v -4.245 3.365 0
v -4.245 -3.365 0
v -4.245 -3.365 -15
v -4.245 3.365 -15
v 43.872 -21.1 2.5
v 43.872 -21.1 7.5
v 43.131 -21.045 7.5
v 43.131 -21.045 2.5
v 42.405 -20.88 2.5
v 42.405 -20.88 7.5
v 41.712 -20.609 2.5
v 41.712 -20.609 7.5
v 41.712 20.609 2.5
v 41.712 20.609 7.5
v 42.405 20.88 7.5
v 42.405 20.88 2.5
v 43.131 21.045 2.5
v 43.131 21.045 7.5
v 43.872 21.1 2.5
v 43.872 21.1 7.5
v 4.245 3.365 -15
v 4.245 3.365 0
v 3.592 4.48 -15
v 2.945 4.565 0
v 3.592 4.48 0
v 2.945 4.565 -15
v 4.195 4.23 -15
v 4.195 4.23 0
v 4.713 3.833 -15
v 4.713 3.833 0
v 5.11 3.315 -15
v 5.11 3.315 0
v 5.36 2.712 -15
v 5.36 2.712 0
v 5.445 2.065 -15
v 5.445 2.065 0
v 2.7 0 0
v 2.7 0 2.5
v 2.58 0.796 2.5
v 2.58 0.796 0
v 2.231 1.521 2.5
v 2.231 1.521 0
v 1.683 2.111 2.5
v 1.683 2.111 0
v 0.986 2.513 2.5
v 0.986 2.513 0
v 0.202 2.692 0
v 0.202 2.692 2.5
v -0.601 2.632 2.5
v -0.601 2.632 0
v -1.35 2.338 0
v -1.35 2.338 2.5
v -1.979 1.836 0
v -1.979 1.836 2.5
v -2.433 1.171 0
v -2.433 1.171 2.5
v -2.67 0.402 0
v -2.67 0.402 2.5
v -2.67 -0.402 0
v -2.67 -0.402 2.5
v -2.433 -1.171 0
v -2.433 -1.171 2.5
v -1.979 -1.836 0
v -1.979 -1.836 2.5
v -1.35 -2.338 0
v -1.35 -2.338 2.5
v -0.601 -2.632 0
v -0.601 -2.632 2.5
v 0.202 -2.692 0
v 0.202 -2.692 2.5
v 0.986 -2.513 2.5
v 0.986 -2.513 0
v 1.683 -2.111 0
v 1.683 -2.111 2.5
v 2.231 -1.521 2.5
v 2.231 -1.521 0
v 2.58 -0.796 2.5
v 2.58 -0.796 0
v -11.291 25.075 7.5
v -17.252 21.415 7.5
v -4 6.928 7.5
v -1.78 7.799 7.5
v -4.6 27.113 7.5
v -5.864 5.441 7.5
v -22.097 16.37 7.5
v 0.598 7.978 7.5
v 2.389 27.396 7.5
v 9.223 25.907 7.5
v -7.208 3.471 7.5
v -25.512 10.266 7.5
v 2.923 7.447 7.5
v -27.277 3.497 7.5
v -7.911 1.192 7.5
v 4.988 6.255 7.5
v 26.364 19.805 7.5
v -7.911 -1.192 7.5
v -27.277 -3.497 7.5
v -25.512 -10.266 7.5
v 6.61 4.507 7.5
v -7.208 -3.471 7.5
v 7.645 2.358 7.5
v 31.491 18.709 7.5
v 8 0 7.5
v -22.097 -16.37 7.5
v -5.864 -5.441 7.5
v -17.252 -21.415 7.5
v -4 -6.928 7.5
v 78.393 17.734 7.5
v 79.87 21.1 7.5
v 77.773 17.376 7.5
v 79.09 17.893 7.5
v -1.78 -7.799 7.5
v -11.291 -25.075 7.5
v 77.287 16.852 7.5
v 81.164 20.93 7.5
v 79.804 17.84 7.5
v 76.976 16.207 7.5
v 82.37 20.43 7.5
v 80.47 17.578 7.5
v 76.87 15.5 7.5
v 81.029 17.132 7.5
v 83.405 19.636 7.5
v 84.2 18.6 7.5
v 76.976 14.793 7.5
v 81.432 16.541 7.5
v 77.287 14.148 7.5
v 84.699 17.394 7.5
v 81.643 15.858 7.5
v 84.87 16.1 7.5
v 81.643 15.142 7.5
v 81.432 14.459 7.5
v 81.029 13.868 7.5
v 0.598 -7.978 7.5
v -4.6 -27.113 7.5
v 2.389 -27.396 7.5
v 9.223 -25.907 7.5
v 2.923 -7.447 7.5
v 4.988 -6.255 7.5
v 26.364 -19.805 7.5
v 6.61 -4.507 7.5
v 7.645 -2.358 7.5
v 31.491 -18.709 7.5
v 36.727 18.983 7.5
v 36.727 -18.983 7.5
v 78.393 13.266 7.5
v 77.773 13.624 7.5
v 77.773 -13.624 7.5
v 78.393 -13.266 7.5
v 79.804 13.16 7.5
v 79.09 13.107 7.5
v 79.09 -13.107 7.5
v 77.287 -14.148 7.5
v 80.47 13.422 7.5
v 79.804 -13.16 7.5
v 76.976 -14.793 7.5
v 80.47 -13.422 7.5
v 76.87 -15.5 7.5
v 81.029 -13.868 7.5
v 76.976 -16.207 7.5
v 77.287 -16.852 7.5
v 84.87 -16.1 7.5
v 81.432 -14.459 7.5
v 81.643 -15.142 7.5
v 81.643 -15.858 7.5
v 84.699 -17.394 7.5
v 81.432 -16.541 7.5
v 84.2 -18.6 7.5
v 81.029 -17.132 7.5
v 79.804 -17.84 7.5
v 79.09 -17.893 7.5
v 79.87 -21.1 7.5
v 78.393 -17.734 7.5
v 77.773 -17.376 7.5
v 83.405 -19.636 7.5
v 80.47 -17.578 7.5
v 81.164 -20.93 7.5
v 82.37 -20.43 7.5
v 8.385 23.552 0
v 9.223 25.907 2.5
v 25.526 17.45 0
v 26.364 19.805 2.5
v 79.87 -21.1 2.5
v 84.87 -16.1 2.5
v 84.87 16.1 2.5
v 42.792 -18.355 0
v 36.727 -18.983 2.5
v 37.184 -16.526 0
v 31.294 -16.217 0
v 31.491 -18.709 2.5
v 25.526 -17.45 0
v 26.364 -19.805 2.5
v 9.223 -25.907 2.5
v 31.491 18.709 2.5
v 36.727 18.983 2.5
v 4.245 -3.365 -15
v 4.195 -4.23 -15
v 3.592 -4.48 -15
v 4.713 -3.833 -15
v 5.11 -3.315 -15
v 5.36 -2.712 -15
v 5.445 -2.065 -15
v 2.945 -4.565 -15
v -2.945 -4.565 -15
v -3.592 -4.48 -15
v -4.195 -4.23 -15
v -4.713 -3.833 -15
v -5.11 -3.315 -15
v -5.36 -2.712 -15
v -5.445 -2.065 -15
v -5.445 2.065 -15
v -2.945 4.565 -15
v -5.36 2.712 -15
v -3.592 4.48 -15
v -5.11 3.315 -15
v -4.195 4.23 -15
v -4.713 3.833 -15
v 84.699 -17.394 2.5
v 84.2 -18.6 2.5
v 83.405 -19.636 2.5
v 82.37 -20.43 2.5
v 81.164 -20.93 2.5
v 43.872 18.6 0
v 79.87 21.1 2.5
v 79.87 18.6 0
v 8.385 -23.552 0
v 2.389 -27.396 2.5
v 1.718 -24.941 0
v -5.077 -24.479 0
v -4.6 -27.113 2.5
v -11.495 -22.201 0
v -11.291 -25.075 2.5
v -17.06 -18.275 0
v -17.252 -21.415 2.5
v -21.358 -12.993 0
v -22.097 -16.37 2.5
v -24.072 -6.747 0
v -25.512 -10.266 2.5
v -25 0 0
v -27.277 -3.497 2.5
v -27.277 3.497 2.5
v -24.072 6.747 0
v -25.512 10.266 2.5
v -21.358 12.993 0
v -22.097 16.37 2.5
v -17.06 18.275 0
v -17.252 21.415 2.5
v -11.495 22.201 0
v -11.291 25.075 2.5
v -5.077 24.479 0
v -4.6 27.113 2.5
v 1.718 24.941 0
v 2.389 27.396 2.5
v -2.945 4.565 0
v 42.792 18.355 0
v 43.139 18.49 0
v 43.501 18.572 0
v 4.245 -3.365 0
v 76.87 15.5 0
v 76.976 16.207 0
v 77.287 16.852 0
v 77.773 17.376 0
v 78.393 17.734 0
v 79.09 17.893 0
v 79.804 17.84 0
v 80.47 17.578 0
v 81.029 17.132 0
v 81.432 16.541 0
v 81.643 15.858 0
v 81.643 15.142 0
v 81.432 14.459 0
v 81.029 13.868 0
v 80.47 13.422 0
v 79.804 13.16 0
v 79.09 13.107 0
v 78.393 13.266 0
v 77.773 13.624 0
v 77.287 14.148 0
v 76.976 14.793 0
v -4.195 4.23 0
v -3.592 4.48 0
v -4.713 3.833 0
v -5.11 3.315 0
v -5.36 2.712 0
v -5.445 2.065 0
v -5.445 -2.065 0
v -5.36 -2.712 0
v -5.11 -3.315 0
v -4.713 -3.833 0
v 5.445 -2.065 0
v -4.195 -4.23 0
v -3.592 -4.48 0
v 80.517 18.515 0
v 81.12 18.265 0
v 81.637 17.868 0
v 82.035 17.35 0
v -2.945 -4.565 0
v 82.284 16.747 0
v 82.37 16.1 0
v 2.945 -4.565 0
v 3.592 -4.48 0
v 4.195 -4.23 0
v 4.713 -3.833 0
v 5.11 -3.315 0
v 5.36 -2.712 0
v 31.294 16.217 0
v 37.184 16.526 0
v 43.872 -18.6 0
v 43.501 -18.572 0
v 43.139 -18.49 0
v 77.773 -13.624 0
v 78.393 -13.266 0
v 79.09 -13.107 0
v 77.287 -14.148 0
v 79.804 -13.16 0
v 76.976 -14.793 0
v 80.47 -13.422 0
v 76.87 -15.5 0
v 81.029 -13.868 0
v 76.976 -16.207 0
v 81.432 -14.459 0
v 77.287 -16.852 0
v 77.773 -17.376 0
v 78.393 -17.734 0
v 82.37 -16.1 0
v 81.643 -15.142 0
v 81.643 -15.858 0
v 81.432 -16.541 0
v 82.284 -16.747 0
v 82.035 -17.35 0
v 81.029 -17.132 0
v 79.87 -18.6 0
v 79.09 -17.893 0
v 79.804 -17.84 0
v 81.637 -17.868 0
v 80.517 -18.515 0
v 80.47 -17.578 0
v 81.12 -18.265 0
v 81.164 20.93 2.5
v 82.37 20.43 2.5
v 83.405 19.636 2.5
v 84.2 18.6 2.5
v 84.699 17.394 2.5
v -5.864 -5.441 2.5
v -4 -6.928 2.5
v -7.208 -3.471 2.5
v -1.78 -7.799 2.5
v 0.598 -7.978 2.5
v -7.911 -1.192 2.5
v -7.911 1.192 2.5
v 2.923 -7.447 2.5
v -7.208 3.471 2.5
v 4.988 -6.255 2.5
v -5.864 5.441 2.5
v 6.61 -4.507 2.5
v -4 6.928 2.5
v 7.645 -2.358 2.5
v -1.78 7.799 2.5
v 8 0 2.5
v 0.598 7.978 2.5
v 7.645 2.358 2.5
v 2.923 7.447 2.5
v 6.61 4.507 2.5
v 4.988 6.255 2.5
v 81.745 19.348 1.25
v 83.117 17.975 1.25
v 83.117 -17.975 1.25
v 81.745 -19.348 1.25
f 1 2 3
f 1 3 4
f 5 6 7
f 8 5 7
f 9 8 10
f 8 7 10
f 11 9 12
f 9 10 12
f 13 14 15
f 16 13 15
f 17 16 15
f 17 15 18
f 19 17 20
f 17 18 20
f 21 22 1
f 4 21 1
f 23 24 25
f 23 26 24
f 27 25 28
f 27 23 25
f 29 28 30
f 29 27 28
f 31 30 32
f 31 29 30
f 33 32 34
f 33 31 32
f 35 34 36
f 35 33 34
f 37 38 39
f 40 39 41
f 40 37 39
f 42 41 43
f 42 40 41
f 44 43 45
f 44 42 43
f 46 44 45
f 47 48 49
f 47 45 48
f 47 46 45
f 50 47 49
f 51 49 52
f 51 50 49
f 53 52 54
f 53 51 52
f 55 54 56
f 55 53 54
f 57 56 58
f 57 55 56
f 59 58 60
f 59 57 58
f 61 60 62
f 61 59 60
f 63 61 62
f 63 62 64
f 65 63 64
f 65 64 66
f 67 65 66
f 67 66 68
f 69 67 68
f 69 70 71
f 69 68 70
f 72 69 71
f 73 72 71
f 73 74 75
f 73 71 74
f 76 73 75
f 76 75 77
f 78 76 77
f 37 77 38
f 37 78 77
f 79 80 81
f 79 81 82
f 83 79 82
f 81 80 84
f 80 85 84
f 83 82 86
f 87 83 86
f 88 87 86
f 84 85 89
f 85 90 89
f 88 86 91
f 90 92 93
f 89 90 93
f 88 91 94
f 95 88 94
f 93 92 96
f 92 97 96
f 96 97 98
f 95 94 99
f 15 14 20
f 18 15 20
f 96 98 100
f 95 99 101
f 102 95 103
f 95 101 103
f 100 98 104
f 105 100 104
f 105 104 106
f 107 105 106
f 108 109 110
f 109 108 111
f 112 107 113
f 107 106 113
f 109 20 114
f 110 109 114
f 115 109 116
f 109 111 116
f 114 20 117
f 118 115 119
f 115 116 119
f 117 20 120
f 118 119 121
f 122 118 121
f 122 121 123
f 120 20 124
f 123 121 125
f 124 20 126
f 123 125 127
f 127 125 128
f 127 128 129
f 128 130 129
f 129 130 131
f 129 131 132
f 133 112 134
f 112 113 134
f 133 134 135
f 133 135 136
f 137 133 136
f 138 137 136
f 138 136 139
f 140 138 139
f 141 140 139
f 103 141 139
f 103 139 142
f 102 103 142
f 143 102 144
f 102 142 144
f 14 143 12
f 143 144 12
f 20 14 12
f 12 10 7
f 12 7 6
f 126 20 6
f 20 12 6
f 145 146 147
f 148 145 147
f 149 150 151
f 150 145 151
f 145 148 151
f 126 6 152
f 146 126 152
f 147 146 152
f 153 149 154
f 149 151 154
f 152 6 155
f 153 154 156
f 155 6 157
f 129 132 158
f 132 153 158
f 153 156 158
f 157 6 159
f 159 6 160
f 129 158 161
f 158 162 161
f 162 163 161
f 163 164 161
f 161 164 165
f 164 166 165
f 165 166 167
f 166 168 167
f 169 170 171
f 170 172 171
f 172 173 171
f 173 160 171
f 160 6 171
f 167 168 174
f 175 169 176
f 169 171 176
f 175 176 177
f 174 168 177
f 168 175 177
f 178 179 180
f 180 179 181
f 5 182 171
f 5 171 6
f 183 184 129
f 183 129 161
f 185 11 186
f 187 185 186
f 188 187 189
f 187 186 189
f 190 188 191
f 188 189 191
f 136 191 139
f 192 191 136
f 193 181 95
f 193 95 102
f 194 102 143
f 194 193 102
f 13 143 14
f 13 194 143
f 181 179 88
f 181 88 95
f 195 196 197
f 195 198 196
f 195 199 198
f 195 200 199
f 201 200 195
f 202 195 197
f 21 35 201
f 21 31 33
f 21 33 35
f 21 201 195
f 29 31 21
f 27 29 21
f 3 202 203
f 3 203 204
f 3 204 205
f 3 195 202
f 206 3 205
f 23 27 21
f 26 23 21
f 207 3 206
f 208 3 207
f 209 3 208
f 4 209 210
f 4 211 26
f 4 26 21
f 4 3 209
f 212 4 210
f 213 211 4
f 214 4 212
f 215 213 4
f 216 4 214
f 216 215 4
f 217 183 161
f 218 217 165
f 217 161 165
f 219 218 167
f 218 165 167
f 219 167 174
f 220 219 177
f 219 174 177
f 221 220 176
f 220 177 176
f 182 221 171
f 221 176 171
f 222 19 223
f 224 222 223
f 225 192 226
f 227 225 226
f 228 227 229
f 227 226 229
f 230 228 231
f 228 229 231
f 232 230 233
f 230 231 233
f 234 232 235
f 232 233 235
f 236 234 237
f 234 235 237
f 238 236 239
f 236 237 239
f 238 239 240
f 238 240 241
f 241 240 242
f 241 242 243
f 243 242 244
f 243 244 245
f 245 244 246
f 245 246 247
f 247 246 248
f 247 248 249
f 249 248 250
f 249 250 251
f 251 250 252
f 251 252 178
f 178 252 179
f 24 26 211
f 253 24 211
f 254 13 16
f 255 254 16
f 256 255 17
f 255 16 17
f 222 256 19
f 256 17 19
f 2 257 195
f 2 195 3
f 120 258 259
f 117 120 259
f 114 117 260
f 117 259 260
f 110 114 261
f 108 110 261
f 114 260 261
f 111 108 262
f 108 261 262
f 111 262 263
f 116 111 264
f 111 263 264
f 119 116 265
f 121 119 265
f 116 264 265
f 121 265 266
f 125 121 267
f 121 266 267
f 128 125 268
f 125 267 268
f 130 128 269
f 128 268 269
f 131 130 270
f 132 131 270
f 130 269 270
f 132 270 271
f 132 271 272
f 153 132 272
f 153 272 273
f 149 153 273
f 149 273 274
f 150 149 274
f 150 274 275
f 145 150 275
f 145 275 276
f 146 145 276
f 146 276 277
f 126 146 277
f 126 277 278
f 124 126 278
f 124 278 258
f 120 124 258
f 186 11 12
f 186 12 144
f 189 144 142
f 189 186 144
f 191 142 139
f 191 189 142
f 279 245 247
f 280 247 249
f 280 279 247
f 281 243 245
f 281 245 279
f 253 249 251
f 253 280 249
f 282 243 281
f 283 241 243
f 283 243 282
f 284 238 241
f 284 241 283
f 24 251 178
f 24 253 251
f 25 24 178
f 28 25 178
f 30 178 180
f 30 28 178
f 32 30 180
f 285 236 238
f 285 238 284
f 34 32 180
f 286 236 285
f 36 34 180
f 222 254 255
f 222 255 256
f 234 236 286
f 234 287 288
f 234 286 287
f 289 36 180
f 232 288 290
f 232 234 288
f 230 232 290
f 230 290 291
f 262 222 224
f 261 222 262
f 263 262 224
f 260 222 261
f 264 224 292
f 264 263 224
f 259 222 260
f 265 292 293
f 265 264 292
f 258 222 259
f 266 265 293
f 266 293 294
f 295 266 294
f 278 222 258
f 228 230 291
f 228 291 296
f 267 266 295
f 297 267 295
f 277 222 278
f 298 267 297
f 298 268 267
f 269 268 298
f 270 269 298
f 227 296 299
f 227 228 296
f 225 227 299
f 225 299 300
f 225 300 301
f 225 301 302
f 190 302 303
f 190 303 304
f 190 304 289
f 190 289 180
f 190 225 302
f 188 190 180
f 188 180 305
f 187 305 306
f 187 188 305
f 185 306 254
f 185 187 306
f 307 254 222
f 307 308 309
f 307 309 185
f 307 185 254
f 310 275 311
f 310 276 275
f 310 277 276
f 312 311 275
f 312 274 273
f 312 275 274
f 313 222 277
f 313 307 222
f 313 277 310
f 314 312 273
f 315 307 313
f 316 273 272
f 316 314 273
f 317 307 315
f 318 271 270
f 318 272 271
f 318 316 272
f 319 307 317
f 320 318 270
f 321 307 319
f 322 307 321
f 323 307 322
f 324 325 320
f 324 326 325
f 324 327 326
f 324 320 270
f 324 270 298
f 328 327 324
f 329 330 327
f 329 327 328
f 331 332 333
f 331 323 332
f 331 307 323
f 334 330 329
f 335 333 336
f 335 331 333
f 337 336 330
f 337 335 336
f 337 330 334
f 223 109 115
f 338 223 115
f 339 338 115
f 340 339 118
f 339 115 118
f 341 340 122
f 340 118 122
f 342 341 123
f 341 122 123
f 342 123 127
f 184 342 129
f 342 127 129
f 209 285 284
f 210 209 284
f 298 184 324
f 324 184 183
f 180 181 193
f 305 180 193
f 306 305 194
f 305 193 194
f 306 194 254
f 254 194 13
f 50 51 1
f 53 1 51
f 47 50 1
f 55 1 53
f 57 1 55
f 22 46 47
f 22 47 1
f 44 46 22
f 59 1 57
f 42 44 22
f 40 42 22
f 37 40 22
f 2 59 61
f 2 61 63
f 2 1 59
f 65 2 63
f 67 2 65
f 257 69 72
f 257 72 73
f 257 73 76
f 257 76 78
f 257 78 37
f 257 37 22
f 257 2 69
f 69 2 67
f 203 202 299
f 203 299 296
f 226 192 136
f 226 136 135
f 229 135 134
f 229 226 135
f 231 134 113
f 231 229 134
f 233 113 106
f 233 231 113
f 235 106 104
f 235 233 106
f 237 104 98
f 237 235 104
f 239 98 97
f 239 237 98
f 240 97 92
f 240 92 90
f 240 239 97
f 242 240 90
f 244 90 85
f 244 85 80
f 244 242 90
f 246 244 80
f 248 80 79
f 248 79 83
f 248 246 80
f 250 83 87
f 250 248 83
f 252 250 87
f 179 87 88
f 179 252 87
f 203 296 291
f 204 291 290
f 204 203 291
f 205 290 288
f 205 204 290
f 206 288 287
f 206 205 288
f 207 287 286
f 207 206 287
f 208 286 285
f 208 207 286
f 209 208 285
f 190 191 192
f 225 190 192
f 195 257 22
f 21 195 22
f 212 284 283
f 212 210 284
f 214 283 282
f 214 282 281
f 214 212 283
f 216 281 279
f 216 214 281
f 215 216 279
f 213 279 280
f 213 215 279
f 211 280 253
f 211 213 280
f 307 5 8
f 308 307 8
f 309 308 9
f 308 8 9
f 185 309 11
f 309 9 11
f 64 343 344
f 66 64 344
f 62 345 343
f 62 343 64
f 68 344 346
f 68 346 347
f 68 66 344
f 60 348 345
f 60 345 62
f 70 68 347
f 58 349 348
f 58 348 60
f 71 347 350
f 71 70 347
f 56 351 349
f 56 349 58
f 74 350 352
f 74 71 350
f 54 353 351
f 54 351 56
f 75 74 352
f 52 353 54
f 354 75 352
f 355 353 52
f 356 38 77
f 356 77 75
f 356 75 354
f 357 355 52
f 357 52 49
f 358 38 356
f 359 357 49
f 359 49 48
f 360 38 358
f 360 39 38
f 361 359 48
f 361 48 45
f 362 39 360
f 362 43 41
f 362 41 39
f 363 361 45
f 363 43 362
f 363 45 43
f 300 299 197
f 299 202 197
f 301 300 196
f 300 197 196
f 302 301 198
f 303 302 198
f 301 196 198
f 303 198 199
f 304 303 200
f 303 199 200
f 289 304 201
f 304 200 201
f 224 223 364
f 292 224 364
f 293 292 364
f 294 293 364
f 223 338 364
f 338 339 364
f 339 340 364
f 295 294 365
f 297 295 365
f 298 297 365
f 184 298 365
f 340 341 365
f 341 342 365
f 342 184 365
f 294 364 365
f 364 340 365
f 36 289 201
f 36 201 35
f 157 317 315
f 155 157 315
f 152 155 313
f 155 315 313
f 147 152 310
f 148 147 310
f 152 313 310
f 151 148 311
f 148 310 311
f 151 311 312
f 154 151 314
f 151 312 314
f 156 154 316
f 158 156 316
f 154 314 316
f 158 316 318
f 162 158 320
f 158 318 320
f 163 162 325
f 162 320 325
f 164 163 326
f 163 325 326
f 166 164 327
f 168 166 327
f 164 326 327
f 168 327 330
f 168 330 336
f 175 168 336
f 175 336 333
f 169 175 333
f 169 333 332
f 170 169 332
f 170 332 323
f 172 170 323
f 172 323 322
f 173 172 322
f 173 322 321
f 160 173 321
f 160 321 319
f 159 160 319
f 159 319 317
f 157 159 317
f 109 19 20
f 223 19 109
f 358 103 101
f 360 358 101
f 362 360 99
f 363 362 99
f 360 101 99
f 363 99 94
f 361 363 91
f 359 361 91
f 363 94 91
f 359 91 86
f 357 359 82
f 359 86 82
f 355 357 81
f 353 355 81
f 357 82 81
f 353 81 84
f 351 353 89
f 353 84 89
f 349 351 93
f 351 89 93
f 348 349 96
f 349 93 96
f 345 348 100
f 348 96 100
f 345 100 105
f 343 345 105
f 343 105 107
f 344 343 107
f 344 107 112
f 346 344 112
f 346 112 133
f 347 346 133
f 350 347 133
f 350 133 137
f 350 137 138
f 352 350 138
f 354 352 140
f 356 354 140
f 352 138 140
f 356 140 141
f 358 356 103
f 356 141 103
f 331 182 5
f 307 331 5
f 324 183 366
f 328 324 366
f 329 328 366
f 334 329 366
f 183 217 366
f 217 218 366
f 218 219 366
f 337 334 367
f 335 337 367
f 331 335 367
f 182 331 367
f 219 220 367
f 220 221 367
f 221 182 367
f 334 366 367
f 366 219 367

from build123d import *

# Parameters (mm, degrees)
SKETCH1_R                    = 1.5
SKETCH1_R_2                  = 2.7
BOSS_EXTRUDE1_DEPTH          = 7.5
SKETCH3_R                    = 8
CUT_EXTRUDE2_DEPTH           = 5
FILLET2_R                    = 20
TALADRO_DE_MARGEN_PARA_M41_D = 4.8
FILLET3_R                    = 5
CHAMFER1_SIZE                = 2.5
SKETCH7_W                    = 10.89
SKETCH7_H                    = 9.13
SKETCH7_W_2                  = 8.49
SKETCH7_H_2                  = 6.73
BOSS_EXTRUDE2_DEPTH          = 15
FILLET5_R                    = 2.5


with BuildPart() as part:
    # Sketch1 → Boss-Extrude1 (new body)
    with BuildSketch(Plane.XY):
        with BuildLine():
            Line((42.669600757, 14), (42.669600757, 21.1))
            Line((42.669600757, 21.1), (84.869600757, 21.1))
            Line((84.869600757, 21.1), (84.869600757, -21.1))
            Line((84.869600757, -21.1), (42.669600757, -21.1))
            Line((42.669600757, -21.1), (42.669600757, -14))
            Line((42.669600757, -14), (9.223174911, -25.907200632))
            ThreePointArc((9.223174911, -25.907200632), (-27.5, 0), (9.223174911, 25.907200632))
            Line((9.223174911, 25.907200632), (42.669600757, 14))
        make_face()
        with Locations((79.269600757, 15.5)):
            Circle(SKETCH1_R, mode=Mode.SUBTRACT)
        with Locations((79.269600757, -15.5)):
            Circle(SKETCH1_R, mode=Mode.SUBTRACT)
        Circle(SKETCH1_R_2, mode=Mode.SUBTRACT)
    extrude(amount=BOSS_EXTRUDE1_DEPTH)

    # Sketch3 → Cut-Extrude2 (cut)
    with BuildSketch(Plane.XY.offset(7.5)):
        Circle(SKETCH3_R)
    extrude(amount=-CUT_EXTRUDE2_DEPTH, mode=Mode.SUBTRACT)

    # Fillet2
    # the kernel refuses this fillet: 20 mm, written as the material it adds along each edge
    with BuildSketch(Plane(origin=(42.669600757, -14, 0), x_dir=(-0.9420800229659998, -0.3353881785757827, 0), z_dir=(0, 0, 1))) as fillet2_piece_1:
        with BuildLine():
            CenterArc((17.308114645, 20), FILLET2_R, 221.725423621, 48.274576379)
            Line((2.381256068, 6.688768163), (2.082718896, 6.422543526))
            ThreePointArc((2.082718896, 6.422543526), (0.813796025, 3.478539353), (-0.376832009, 0.134155271))
            Line((-0.376832009, 0.134155271), (0, -0.4))
            Line((0, -0.4), (17.308114645, -0.4))
            Line((17.308114645, -0.4), (17.308114645, 0))
        make_face()
    extrude(amount=7.5)
    with BuildSketch(Plane(origin=(42.669600757, 14, 0), x_dir=(-0.9420800229659999, 0.3353881785757825, 0), z_dir=(0, 0, 1))) as fillet2_piece_2:
        with BuildLine():
            CenterArc((17.308114645, -20), FILLET2_R, 90, 48.274576379)
            Line((2.381256068, -6.688768163), (2.082718896, -6.422543526))
            ThreePointArc((2.082718896, -6.422543526), (0.813796025, -3.478539353), (-0.376832009, -0.134155271))
            Line((-0.376832009, -0.134155271), (0, 0.4))
            Line((0, 0.4), (17.308114645, 0.4))
            Line((17.308114645, 0.4), (17.308114645, 0))
        make_face()
    extrude(amount=7.5)

    # Taladro de margen para M41 (through all)
    with Locations(Plane.XY.offset(7.5)):
        with Locations((79.269600757, -15.5), (79.269600757, 15.5)):
            Hole(TALADRO_DE_MARGEN_PARA_M41_D / 2)

    # Fillet3
    fillet3_edges = [part.edges().sort_by_distance(p)[0] for p in [
        (42.669600757, 21.1, 3.75),
        (84.869600757, 21.1, 3.75),
        (84.869600757, -21.1, 3.75),
        (42.669600757, -21.1, 3.75),
    ]]
    fillet(fillet3_edges, radius=FILLET3_R)

    # Chamfer1
    chamfer1_edges = [part.edges().sort_by_distance(p)[0] for p in [
        (17.793573313, -22.856068838, 0),
        (-27.5, 0, 0),
        (17.793573313, 22.856068838, 0),
        (34.118456698, 18.673946929, 0),
        (84.869600757, 0, 0),
        (61.870983905, 21.1, 0),
        (61.870983905, -21.1, 0),
        (34.118456698, -18.673946929, 0),
        (42.76478805, 20.975783912, 0),
        (42.76478805, -20.975783912, 0),
        (83.405134663, 19.635533906, 0),
        (83.405134663, -19.635533906, 0),
    ]]
    chamfer(chamfer1_edges, length=CHAMFER1_SIZE)

    # Sketch7 → Boss-Extrude2 (add)
    with BuildSketch(Plane(origin=(0, 0, 0), x_dir=(-1, 0, 0), z_dir=(0, 0, -1))):
        Rectangle(SKETCH7_W, SKETCH7_H)
        Rectangle(SKETCH7_W_2, SKETCH7_H_2, mode=Mode.SUBTRACT)
    extrude(amount=BOSS_EXTRUDE2_DEPTH)

    # Fillet5
    fillet5_edges = [part.edges().sort_by_distance(p)[0] for p in [
        (5.445, 4.565, -7.5),
        (5.445, -4.565, -7.5),
        (-5.445, -4.565, -7.5),
        (-5.445, 4.565, -7.5),
    ]]
    fillet(fillet5_edges, radius=FILLET5_R)


solid = part.part
